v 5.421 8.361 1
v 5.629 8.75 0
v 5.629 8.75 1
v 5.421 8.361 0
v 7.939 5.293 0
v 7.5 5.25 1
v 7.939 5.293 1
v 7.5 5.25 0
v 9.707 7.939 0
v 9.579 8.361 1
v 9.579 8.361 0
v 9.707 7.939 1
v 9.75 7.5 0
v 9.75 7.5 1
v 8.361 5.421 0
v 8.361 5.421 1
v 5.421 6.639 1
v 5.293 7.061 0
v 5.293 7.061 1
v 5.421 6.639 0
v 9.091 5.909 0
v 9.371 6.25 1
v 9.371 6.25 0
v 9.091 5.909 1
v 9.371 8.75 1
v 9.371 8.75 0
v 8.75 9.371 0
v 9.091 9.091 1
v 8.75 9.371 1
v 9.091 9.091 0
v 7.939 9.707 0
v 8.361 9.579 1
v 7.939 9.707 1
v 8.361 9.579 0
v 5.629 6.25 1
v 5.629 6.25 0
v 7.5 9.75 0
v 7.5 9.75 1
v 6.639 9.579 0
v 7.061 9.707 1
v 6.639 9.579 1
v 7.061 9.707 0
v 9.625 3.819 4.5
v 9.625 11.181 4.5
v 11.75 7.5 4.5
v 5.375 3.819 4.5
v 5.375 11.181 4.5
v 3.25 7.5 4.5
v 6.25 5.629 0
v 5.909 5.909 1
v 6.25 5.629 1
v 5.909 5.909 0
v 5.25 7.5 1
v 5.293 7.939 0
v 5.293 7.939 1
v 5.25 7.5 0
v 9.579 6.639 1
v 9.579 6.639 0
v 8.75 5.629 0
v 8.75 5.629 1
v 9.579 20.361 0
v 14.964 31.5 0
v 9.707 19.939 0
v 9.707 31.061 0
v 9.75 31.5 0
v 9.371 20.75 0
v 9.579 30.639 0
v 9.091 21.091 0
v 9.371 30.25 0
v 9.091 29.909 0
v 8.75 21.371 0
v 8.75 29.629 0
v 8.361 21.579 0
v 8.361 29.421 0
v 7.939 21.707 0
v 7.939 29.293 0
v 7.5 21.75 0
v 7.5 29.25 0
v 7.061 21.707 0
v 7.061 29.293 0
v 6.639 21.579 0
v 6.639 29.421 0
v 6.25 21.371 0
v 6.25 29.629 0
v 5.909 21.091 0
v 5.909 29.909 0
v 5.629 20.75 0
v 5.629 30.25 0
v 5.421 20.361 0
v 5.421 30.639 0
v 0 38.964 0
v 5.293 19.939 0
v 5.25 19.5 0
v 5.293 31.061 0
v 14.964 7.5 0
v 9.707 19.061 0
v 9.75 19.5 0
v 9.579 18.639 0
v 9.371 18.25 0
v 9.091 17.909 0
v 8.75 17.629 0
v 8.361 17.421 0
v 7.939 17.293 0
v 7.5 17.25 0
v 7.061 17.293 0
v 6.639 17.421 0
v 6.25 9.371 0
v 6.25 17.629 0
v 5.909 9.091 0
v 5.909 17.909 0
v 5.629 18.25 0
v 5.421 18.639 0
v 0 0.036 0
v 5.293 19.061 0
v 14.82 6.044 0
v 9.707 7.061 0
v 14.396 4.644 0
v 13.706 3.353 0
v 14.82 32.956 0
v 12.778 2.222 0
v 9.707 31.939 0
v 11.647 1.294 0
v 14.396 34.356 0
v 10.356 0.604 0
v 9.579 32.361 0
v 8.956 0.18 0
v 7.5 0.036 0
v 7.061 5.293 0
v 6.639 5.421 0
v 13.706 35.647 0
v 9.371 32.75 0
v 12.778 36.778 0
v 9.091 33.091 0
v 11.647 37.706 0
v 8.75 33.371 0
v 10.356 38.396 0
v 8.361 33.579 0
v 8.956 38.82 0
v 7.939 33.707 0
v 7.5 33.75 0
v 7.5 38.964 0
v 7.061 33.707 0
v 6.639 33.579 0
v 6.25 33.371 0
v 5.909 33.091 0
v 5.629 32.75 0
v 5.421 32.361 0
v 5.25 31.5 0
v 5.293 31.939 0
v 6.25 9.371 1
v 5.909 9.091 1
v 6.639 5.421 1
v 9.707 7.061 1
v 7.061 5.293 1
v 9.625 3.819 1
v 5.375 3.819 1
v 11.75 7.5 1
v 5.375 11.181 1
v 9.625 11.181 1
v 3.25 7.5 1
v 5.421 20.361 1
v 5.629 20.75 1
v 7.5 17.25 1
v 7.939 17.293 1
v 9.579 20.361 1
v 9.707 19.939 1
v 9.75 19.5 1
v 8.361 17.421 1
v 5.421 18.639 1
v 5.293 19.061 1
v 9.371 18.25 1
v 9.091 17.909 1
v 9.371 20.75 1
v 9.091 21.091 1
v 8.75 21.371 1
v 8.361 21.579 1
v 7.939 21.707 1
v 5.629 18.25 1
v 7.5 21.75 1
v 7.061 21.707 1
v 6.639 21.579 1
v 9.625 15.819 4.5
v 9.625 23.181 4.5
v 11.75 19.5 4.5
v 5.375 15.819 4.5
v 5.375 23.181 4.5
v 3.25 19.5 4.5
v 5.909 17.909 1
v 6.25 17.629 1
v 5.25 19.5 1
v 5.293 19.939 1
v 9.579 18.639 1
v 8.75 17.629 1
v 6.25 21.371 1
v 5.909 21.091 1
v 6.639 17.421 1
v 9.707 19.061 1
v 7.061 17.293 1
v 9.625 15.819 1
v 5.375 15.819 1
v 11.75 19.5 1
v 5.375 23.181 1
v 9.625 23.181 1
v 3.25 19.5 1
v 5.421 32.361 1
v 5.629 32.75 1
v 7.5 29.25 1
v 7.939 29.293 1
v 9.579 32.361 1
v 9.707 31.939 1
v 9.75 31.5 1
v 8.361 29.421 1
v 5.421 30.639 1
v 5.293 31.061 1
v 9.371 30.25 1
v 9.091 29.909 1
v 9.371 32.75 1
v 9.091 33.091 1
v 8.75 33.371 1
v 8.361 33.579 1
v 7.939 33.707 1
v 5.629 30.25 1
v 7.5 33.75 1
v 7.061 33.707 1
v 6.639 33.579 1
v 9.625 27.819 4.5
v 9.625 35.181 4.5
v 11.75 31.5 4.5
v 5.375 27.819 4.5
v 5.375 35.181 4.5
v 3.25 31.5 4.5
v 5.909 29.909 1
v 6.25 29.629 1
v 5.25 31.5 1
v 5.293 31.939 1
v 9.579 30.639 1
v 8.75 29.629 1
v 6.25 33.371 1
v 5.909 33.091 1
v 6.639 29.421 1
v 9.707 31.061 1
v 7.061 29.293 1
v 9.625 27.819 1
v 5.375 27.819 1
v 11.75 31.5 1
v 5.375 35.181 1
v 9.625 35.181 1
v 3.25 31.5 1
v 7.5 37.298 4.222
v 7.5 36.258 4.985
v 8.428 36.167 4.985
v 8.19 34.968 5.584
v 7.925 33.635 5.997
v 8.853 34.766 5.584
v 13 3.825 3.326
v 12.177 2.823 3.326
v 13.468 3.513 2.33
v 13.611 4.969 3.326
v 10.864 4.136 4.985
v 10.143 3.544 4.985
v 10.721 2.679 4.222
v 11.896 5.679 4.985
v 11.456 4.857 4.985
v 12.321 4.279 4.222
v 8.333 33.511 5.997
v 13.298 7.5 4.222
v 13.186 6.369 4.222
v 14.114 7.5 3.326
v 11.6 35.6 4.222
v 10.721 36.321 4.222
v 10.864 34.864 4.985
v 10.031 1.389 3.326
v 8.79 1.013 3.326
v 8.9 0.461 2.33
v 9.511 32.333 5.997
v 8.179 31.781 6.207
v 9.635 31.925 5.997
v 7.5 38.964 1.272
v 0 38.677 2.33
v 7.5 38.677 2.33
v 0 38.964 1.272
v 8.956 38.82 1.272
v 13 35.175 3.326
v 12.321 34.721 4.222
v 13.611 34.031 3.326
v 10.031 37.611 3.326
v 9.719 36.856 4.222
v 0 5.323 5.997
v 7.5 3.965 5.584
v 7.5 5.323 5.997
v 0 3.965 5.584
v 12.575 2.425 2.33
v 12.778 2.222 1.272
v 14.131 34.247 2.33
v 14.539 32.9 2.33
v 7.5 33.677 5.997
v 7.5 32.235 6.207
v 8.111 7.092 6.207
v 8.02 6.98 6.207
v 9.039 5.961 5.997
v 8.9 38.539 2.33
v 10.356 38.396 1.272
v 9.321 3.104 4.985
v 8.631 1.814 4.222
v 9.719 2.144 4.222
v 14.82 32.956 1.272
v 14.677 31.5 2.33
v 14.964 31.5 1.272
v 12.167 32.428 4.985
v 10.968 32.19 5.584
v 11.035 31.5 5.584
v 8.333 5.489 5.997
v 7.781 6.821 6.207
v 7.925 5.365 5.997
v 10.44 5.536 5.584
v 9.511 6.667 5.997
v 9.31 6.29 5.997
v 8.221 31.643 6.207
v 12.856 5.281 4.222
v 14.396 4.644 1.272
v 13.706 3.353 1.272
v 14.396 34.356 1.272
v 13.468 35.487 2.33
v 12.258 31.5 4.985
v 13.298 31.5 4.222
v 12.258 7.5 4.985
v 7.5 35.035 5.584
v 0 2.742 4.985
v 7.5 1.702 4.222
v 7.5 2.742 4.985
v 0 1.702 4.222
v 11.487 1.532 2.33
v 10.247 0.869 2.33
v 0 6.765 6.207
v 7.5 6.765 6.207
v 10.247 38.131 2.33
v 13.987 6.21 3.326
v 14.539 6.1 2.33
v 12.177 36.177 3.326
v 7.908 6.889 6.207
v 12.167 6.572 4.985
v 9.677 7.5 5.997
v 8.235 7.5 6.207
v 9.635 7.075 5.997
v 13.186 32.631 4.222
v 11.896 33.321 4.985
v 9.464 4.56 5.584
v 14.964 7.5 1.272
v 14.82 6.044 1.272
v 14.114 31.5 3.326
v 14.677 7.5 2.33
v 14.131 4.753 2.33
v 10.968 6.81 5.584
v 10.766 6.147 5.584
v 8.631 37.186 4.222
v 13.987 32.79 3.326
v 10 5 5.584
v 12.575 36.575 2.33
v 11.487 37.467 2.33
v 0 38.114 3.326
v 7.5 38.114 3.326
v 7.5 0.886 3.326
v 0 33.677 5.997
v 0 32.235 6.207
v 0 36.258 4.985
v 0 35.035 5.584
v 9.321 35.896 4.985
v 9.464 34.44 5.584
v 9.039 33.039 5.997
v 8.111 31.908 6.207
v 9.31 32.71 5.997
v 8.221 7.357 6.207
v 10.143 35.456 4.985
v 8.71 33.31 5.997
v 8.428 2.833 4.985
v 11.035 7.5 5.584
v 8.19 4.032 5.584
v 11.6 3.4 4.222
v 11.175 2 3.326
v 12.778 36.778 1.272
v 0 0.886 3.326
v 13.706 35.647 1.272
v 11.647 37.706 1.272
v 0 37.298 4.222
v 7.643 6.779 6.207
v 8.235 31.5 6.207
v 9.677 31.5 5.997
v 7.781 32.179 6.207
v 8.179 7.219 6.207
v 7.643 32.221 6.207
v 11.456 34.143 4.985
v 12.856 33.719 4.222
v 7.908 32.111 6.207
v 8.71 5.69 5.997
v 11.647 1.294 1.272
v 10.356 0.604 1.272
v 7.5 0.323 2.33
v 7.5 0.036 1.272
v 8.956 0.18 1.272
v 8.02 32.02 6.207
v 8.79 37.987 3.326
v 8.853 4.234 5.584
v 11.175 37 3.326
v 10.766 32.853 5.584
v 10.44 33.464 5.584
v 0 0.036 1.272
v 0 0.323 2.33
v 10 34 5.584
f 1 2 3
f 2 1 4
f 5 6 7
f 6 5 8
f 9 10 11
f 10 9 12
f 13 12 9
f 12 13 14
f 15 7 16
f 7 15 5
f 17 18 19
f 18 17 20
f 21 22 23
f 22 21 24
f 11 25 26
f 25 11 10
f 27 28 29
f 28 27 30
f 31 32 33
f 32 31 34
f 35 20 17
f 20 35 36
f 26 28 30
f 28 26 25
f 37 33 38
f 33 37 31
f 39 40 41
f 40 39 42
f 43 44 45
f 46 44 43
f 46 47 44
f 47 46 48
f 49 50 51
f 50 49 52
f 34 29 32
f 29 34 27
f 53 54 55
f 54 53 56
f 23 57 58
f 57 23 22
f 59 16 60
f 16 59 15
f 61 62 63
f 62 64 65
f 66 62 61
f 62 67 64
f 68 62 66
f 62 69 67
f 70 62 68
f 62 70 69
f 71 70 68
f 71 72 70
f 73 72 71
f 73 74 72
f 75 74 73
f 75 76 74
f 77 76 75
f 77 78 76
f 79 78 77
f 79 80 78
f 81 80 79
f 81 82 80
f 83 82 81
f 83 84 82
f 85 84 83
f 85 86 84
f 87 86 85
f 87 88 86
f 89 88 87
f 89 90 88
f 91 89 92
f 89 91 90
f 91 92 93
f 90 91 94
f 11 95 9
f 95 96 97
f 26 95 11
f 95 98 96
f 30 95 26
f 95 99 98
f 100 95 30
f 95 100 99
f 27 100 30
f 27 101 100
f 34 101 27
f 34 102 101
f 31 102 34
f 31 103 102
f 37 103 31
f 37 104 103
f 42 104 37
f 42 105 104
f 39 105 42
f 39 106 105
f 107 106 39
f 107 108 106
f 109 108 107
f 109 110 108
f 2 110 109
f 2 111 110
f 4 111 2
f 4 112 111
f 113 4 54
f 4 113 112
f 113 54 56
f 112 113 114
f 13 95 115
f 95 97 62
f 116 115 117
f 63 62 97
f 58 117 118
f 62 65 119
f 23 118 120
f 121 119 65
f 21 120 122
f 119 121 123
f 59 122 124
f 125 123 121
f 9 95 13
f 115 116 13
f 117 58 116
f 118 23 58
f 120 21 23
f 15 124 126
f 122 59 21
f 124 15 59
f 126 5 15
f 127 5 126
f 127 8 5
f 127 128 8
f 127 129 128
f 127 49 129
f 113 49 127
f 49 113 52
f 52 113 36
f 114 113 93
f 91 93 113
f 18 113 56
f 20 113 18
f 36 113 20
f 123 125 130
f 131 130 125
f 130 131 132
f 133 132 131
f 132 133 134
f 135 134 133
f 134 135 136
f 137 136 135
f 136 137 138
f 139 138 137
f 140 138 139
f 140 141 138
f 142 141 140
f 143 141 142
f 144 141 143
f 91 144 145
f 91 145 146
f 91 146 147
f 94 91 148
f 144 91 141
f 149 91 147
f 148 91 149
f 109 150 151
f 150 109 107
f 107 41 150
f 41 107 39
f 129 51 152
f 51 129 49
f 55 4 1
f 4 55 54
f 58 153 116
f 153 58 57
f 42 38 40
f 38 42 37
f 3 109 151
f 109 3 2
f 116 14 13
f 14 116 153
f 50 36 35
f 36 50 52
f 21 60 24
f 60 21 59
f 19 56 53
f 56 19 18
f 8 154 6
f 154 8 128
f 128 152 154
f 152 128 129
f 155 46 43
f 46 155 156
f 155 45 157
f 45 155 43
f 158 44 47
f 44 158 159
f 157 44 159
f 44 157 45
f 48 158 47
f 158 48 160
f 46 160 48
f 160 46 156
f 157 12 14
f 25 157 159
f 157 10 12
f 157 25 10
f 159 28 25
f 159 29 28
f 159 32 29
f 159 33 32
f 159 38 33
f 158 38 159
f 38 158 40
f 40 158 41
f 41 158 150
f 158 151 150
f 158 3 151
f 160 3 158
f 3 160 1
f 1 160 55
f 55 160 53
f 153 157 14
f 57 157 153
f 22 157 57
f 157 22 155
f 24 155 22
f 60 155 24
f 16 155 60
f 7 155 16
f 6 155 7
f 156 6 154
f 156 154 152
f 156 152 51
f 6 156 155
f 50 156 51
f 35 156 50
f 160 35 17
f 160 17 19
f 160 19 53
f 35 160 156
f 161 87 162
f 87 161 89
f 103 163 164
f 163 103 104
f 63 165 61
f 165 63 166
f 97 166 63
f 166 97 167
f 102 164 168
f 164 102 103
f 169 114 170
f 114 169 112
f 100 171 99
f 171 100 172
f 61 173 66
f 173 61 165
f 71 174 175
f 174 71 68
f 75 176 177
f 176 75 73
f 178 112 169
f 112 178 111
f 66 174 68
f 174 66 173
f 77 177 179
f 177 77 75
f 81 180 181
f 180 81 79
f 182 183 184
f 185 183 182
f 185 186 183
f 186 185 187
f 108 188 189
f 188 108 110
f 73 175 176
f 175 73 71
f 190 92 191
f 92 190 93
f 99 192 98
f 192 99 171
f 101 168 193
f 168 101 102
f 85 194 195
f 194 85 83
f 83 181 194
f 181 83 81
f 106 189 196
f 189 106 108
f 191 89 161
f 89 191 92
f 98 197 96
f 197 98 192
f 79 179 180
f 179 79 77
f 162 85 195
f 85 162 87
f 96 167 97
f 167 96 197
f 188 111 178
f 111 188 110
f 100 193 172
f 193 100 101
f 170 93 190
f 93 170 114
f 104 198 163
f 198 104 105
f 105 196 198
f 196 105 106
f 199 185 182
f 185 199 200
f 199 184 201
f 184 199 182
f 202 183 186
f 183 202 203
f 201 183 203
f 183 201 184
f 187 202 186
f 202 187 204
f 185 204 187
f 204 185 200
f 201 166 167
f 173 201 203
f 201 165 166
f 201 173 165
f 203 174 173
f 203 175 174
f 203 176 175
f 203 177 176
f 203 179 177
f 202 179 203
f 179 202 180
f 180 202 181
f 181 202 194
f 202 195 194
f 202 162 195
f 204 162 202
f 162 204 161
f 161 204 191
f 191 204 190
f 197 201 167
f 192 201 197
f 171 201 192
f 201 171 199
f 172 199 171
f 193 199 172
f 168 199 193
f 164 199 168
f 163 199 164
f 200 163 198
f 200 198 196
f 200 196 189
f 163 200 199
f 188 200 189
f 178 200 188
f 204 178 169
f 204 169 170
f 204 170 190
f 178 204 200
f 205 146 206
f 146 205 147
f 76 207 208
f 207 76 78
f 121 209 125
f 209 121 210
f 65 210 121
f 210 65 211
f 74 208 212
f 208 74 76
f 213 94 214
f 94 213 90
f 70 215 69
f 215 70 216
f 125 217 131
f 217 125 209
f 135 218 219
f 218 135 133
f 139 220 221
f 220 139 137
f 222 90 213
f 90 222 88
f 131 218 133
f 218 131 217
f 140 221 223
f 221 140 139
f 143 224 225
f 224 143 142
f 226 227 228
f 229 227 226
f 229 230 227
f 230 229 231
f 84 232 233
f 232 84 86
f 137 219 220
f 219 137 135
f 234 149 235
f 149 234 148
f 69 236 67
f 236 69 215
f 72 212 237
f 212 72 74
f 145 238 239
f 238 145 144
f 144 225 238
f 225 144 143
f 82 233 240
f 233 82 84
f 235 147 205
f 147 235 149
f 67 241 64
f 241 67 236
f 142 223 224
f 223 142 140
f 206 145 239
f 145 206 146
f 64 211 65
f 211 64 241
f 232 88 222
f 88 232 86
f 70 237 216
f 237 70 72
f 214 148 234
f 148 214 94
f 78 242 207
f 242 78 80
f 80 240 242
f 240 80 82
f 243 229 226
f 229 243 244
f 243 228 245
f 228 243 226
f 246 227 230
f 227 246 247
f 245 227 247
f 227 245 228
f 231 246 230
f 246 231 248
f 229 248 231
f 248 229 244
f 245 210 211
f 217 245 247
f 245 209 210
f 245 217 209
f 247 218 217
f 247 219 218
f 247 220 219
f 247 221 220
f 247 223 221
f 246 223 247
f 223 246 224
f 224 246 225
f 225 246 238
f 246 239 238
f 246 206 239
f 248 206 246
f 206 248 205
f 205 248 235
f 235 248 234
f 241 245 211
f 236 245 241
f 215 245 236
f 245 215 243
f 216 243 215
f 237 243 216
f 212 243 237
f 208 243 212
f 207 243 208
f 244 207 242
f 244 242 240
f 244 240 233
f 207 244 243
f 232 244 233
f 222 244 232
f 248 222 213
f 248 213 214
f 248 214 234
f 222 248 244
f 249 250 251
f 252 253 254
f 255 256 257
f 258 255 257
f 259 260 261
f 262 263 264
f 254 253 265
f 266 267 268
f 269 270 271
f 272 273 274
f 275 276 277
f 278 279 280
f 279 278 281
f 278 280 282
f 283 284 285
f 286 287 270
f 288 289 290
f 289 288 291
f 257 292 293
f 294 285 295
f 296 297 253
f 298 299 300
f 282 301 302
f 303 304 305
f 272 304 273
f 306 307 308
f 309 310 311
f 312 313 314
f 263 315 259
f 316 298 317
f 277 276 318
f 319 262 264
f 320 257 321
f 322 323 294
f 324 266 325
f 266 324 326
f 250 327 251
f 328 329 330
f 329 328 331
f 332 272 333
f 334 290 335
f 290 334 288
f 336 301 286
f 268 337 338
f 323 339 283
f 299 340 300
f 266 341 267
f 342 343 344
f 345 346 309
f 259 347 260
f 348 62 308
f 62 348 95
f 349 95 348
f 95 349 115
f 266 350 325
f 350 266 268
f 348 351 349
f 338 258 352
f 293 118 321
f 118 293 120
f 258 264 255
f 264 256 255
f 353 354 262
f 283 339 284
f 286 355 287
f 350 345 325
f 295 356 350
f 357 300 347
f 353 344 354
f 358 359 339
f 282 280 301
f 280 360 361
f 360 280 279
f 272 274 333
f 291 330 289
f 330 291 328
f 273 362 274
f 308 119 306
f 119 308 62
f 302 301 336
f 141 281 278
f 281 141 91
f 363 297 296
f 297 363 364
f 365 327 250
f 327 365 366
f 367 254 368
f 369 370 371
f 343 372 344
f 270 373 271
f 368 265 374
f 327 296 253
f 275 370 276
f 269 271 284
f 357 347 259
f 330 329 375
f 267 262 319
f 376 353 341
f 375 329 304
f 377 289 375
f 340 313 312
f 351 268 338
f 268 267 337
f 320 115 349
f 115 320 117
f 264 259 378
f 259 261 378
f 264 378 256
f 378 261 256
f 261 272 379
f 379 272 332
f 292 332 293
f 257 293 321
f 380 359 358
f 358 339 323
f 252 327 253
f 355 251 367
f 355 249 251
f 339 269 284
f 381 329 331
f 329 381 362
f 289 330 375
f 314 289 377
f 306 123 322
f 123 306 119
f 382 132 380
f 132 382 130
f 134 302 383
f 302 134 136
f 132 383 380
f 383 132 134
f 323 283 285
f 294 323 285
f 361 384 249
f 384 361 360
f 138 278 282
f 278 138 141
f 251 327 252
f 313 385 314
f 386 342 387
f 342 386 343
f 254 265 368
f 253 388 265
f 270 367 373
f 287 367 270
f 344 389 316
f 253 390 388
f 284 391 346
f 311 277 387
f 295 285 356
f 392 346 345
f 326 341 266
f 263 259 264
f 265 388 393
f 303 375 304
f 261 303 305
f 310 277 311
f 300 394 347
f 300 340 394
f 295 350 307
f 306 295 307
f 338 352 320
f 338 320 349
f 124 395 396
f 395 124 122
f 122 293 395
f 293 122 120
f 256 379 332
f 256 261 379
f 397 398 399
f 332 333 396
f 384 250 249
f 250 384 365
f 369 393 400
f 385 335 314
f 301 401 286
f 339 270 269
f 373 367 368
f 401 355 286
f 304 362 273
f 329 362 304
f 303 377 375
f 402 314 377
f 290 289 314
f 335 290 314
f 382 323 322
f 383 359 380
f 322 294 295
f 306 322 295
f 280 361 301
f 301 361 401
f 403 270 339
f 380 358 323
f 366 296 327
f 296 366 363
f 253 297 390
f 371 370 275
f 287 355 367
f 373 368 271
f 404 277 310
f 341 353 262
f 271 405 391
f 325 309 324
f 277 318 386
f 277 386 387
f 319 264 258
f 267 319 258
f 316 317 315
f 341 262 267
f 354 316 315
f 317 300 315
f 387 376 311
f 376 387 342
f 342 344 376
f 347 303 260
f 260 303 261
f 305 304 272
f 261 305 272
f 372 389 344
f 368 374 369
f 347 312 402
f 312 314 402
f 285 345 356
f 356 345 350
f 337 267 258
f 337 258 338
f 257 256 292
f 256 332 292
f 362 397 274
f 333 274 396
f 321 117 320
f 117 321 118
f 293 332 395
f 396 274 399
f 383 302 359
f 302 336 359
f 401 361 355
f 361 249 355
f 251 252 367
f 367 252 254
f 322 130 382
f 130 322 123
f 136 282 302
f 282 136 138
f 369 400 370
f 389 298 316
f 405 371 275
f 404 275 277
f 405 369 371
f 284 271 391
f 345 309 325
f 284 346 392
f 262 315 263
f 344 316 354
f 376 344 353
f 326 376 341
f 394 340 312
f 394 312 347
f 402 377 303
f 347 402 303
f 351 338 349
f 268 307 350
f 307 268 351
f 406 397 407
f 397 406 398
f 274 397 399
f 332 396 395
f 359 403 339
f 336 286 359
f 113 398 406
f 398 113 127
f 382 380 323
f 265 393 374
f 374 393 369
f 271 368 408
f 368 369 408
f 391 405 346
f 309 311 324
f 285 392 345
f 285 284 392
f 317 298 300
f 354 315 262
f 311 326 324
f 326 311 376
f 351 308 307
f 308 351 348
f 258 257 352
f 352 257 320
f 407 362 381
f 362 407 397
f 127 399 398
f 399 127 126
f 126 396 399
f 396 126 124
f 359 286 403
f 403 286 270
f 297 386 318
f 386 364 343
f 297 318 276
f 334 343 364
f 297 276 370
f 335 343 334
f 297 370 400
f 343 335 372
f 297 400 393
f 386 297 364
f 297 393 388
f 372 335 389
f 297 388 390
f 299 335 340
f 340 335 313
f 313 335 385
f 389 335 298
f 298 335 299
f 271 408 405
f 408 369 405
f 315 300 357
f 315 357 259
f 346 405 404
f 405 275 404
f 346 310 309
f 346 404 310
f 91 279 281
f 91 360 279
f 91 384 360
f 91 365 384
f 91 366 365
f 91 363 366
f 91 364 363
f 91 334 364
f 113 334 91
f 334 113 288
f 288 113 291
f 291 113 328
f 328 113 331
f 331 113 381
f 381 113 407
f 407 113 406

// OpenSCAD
// file: shared.scad
SIDE_PANEL_THICK=3;
CENTRE_PANEL_THICK=9;
PILLAR_HEIGHT=100;
CLEAR = 0.5;
SLOT_WALL = 2.5;

SIDE_PANEL_SLOT=SIDE_PANEL_THICK+CLEAR+SLOT_WALL*2;
CENTRE_PANEL_SLOT=CENTRE_PANEL_THICK+CLEAR+SLOT_WALL*2;

// M5 CSK fitting 90deg bevel
// h - length of the drill bore including csk
// csk - diameter of the csk
// recess - recess of the csk, added above the csk
module m5csk(h=2.5, csk=10, recess=0) {
    m5bore(h=h);
    translate([0, 0, -(csk/2 - h)]) cylinder(d2=csk, d1=0, h=(csk/2), $fn=32);
    if(recess != 0) {
        translate([0, 0, h]) cylinder(h=recess, d=csk);
    }
}

// M5 clearance bore
// h - length of the bore
module m5bore(h=2.5) {
    cylinder(d=5.5, h=h, $fn=32);
}

// M5 clearance bore with retaining nut
// h - length of the bore
module m5nutbore(h=20, nuth=5) {
    cylinder(d=5.5, h=h, $fn=32);
    translate([0, 0, nuth]) cylinder(d=9, h=4, $fn=6, center=true);
}

// M4 clearance bore with retaining nut
// h - length of the bore
module m4nutbore(h=20, nuth=5) {
    cylinder(d=4.5, h=h, $fn=32);
    translate([0, 0, nuth]) cylinder(d=8.5, h=3.5, $fn=6, center=true);
}

module rrect(x, y, z, r) {
    linear_extrude(z)
    offset(r=r)
    offset(delta=-r)
    square([x, y]);
}

module slot_holder(panel, hole=true) {
    difference() {
        quarter_cylinder(r=30, h=(panel+CLEAR+SLOT_WALL*2));
        translate([2.5, 2.5, SLOT_WALL]) cube([30, 30, panel+CLEAR]);
        if(hole){
            translate([12.5, 12.5, 0]) cylinder(d=2.5, h=SLOT_WALL, $fn=32);
        }
    }
}

module quarter_cylinder(r, h) {
    $fn=128;
    intersection() {
        cylinder(r=r, h=h);
        translate([0, 0, -0.05]) cube([r, r, h+0.1]);
    }
}

module ccube(size, center=false) {
    if(center){
        translate(-(size/2)) cube(size);
    } else {
        translate([-size.x/2, -size.y/2, 0]) cube(size);
    }
}
// main file
use <./shared.scad>;

$fn=32;

module hinge_cover_plate() {
    difference() {
        scale([1, 1, 5.5/7.5]) translate([0, 7.5, 0.5]) minkowski(){
            cube([7.5, 24, 0.5]);
            sphere(r=7.5);
        }
        translate([-0.25, 0, -5.5]) cube([15.5, 39, 5.5]);
        translate([-7.5, 0, -8]) cube([7.5, 39, 15.5]);
        for(y=[7.5, 39/2, 39-7.5]){
            translate([7.5, y, 0]) m4nutbore(h=4.5, nuth=1+3.5/2);
        }
    }
}

module hinge_backing_plate() {
    difference() {
        translate([5, 5, 0]) minkowski(){
            cube([5, 29, 0.5]);
            sphere(r=5);
        }
        translate([0, 0, -5]) cube([15, 39, 5]);
        for(y=[7.5, 39/2, 39-7.5]){
            translate([7.5, y, 0]) m4nutbore(h=4.5, nuth=1+3.5/2);
        }
    }
}

module handle_backing_plate() {
    difference() {
        translate([5, 5, 0]) minkowski(){
            cube([5, 29, 0.5]);
            sphere(r=5);
        }
        translate([0, 0, -5]) cube([15, 39, 5]);
        for(y=[7.5, 39-7.5]){
            translate([7.5, y, 0]) m4nutbore(h=4.5, nuth=1+3.5/2);
        }
    }
}


hinge_cover_plate();
